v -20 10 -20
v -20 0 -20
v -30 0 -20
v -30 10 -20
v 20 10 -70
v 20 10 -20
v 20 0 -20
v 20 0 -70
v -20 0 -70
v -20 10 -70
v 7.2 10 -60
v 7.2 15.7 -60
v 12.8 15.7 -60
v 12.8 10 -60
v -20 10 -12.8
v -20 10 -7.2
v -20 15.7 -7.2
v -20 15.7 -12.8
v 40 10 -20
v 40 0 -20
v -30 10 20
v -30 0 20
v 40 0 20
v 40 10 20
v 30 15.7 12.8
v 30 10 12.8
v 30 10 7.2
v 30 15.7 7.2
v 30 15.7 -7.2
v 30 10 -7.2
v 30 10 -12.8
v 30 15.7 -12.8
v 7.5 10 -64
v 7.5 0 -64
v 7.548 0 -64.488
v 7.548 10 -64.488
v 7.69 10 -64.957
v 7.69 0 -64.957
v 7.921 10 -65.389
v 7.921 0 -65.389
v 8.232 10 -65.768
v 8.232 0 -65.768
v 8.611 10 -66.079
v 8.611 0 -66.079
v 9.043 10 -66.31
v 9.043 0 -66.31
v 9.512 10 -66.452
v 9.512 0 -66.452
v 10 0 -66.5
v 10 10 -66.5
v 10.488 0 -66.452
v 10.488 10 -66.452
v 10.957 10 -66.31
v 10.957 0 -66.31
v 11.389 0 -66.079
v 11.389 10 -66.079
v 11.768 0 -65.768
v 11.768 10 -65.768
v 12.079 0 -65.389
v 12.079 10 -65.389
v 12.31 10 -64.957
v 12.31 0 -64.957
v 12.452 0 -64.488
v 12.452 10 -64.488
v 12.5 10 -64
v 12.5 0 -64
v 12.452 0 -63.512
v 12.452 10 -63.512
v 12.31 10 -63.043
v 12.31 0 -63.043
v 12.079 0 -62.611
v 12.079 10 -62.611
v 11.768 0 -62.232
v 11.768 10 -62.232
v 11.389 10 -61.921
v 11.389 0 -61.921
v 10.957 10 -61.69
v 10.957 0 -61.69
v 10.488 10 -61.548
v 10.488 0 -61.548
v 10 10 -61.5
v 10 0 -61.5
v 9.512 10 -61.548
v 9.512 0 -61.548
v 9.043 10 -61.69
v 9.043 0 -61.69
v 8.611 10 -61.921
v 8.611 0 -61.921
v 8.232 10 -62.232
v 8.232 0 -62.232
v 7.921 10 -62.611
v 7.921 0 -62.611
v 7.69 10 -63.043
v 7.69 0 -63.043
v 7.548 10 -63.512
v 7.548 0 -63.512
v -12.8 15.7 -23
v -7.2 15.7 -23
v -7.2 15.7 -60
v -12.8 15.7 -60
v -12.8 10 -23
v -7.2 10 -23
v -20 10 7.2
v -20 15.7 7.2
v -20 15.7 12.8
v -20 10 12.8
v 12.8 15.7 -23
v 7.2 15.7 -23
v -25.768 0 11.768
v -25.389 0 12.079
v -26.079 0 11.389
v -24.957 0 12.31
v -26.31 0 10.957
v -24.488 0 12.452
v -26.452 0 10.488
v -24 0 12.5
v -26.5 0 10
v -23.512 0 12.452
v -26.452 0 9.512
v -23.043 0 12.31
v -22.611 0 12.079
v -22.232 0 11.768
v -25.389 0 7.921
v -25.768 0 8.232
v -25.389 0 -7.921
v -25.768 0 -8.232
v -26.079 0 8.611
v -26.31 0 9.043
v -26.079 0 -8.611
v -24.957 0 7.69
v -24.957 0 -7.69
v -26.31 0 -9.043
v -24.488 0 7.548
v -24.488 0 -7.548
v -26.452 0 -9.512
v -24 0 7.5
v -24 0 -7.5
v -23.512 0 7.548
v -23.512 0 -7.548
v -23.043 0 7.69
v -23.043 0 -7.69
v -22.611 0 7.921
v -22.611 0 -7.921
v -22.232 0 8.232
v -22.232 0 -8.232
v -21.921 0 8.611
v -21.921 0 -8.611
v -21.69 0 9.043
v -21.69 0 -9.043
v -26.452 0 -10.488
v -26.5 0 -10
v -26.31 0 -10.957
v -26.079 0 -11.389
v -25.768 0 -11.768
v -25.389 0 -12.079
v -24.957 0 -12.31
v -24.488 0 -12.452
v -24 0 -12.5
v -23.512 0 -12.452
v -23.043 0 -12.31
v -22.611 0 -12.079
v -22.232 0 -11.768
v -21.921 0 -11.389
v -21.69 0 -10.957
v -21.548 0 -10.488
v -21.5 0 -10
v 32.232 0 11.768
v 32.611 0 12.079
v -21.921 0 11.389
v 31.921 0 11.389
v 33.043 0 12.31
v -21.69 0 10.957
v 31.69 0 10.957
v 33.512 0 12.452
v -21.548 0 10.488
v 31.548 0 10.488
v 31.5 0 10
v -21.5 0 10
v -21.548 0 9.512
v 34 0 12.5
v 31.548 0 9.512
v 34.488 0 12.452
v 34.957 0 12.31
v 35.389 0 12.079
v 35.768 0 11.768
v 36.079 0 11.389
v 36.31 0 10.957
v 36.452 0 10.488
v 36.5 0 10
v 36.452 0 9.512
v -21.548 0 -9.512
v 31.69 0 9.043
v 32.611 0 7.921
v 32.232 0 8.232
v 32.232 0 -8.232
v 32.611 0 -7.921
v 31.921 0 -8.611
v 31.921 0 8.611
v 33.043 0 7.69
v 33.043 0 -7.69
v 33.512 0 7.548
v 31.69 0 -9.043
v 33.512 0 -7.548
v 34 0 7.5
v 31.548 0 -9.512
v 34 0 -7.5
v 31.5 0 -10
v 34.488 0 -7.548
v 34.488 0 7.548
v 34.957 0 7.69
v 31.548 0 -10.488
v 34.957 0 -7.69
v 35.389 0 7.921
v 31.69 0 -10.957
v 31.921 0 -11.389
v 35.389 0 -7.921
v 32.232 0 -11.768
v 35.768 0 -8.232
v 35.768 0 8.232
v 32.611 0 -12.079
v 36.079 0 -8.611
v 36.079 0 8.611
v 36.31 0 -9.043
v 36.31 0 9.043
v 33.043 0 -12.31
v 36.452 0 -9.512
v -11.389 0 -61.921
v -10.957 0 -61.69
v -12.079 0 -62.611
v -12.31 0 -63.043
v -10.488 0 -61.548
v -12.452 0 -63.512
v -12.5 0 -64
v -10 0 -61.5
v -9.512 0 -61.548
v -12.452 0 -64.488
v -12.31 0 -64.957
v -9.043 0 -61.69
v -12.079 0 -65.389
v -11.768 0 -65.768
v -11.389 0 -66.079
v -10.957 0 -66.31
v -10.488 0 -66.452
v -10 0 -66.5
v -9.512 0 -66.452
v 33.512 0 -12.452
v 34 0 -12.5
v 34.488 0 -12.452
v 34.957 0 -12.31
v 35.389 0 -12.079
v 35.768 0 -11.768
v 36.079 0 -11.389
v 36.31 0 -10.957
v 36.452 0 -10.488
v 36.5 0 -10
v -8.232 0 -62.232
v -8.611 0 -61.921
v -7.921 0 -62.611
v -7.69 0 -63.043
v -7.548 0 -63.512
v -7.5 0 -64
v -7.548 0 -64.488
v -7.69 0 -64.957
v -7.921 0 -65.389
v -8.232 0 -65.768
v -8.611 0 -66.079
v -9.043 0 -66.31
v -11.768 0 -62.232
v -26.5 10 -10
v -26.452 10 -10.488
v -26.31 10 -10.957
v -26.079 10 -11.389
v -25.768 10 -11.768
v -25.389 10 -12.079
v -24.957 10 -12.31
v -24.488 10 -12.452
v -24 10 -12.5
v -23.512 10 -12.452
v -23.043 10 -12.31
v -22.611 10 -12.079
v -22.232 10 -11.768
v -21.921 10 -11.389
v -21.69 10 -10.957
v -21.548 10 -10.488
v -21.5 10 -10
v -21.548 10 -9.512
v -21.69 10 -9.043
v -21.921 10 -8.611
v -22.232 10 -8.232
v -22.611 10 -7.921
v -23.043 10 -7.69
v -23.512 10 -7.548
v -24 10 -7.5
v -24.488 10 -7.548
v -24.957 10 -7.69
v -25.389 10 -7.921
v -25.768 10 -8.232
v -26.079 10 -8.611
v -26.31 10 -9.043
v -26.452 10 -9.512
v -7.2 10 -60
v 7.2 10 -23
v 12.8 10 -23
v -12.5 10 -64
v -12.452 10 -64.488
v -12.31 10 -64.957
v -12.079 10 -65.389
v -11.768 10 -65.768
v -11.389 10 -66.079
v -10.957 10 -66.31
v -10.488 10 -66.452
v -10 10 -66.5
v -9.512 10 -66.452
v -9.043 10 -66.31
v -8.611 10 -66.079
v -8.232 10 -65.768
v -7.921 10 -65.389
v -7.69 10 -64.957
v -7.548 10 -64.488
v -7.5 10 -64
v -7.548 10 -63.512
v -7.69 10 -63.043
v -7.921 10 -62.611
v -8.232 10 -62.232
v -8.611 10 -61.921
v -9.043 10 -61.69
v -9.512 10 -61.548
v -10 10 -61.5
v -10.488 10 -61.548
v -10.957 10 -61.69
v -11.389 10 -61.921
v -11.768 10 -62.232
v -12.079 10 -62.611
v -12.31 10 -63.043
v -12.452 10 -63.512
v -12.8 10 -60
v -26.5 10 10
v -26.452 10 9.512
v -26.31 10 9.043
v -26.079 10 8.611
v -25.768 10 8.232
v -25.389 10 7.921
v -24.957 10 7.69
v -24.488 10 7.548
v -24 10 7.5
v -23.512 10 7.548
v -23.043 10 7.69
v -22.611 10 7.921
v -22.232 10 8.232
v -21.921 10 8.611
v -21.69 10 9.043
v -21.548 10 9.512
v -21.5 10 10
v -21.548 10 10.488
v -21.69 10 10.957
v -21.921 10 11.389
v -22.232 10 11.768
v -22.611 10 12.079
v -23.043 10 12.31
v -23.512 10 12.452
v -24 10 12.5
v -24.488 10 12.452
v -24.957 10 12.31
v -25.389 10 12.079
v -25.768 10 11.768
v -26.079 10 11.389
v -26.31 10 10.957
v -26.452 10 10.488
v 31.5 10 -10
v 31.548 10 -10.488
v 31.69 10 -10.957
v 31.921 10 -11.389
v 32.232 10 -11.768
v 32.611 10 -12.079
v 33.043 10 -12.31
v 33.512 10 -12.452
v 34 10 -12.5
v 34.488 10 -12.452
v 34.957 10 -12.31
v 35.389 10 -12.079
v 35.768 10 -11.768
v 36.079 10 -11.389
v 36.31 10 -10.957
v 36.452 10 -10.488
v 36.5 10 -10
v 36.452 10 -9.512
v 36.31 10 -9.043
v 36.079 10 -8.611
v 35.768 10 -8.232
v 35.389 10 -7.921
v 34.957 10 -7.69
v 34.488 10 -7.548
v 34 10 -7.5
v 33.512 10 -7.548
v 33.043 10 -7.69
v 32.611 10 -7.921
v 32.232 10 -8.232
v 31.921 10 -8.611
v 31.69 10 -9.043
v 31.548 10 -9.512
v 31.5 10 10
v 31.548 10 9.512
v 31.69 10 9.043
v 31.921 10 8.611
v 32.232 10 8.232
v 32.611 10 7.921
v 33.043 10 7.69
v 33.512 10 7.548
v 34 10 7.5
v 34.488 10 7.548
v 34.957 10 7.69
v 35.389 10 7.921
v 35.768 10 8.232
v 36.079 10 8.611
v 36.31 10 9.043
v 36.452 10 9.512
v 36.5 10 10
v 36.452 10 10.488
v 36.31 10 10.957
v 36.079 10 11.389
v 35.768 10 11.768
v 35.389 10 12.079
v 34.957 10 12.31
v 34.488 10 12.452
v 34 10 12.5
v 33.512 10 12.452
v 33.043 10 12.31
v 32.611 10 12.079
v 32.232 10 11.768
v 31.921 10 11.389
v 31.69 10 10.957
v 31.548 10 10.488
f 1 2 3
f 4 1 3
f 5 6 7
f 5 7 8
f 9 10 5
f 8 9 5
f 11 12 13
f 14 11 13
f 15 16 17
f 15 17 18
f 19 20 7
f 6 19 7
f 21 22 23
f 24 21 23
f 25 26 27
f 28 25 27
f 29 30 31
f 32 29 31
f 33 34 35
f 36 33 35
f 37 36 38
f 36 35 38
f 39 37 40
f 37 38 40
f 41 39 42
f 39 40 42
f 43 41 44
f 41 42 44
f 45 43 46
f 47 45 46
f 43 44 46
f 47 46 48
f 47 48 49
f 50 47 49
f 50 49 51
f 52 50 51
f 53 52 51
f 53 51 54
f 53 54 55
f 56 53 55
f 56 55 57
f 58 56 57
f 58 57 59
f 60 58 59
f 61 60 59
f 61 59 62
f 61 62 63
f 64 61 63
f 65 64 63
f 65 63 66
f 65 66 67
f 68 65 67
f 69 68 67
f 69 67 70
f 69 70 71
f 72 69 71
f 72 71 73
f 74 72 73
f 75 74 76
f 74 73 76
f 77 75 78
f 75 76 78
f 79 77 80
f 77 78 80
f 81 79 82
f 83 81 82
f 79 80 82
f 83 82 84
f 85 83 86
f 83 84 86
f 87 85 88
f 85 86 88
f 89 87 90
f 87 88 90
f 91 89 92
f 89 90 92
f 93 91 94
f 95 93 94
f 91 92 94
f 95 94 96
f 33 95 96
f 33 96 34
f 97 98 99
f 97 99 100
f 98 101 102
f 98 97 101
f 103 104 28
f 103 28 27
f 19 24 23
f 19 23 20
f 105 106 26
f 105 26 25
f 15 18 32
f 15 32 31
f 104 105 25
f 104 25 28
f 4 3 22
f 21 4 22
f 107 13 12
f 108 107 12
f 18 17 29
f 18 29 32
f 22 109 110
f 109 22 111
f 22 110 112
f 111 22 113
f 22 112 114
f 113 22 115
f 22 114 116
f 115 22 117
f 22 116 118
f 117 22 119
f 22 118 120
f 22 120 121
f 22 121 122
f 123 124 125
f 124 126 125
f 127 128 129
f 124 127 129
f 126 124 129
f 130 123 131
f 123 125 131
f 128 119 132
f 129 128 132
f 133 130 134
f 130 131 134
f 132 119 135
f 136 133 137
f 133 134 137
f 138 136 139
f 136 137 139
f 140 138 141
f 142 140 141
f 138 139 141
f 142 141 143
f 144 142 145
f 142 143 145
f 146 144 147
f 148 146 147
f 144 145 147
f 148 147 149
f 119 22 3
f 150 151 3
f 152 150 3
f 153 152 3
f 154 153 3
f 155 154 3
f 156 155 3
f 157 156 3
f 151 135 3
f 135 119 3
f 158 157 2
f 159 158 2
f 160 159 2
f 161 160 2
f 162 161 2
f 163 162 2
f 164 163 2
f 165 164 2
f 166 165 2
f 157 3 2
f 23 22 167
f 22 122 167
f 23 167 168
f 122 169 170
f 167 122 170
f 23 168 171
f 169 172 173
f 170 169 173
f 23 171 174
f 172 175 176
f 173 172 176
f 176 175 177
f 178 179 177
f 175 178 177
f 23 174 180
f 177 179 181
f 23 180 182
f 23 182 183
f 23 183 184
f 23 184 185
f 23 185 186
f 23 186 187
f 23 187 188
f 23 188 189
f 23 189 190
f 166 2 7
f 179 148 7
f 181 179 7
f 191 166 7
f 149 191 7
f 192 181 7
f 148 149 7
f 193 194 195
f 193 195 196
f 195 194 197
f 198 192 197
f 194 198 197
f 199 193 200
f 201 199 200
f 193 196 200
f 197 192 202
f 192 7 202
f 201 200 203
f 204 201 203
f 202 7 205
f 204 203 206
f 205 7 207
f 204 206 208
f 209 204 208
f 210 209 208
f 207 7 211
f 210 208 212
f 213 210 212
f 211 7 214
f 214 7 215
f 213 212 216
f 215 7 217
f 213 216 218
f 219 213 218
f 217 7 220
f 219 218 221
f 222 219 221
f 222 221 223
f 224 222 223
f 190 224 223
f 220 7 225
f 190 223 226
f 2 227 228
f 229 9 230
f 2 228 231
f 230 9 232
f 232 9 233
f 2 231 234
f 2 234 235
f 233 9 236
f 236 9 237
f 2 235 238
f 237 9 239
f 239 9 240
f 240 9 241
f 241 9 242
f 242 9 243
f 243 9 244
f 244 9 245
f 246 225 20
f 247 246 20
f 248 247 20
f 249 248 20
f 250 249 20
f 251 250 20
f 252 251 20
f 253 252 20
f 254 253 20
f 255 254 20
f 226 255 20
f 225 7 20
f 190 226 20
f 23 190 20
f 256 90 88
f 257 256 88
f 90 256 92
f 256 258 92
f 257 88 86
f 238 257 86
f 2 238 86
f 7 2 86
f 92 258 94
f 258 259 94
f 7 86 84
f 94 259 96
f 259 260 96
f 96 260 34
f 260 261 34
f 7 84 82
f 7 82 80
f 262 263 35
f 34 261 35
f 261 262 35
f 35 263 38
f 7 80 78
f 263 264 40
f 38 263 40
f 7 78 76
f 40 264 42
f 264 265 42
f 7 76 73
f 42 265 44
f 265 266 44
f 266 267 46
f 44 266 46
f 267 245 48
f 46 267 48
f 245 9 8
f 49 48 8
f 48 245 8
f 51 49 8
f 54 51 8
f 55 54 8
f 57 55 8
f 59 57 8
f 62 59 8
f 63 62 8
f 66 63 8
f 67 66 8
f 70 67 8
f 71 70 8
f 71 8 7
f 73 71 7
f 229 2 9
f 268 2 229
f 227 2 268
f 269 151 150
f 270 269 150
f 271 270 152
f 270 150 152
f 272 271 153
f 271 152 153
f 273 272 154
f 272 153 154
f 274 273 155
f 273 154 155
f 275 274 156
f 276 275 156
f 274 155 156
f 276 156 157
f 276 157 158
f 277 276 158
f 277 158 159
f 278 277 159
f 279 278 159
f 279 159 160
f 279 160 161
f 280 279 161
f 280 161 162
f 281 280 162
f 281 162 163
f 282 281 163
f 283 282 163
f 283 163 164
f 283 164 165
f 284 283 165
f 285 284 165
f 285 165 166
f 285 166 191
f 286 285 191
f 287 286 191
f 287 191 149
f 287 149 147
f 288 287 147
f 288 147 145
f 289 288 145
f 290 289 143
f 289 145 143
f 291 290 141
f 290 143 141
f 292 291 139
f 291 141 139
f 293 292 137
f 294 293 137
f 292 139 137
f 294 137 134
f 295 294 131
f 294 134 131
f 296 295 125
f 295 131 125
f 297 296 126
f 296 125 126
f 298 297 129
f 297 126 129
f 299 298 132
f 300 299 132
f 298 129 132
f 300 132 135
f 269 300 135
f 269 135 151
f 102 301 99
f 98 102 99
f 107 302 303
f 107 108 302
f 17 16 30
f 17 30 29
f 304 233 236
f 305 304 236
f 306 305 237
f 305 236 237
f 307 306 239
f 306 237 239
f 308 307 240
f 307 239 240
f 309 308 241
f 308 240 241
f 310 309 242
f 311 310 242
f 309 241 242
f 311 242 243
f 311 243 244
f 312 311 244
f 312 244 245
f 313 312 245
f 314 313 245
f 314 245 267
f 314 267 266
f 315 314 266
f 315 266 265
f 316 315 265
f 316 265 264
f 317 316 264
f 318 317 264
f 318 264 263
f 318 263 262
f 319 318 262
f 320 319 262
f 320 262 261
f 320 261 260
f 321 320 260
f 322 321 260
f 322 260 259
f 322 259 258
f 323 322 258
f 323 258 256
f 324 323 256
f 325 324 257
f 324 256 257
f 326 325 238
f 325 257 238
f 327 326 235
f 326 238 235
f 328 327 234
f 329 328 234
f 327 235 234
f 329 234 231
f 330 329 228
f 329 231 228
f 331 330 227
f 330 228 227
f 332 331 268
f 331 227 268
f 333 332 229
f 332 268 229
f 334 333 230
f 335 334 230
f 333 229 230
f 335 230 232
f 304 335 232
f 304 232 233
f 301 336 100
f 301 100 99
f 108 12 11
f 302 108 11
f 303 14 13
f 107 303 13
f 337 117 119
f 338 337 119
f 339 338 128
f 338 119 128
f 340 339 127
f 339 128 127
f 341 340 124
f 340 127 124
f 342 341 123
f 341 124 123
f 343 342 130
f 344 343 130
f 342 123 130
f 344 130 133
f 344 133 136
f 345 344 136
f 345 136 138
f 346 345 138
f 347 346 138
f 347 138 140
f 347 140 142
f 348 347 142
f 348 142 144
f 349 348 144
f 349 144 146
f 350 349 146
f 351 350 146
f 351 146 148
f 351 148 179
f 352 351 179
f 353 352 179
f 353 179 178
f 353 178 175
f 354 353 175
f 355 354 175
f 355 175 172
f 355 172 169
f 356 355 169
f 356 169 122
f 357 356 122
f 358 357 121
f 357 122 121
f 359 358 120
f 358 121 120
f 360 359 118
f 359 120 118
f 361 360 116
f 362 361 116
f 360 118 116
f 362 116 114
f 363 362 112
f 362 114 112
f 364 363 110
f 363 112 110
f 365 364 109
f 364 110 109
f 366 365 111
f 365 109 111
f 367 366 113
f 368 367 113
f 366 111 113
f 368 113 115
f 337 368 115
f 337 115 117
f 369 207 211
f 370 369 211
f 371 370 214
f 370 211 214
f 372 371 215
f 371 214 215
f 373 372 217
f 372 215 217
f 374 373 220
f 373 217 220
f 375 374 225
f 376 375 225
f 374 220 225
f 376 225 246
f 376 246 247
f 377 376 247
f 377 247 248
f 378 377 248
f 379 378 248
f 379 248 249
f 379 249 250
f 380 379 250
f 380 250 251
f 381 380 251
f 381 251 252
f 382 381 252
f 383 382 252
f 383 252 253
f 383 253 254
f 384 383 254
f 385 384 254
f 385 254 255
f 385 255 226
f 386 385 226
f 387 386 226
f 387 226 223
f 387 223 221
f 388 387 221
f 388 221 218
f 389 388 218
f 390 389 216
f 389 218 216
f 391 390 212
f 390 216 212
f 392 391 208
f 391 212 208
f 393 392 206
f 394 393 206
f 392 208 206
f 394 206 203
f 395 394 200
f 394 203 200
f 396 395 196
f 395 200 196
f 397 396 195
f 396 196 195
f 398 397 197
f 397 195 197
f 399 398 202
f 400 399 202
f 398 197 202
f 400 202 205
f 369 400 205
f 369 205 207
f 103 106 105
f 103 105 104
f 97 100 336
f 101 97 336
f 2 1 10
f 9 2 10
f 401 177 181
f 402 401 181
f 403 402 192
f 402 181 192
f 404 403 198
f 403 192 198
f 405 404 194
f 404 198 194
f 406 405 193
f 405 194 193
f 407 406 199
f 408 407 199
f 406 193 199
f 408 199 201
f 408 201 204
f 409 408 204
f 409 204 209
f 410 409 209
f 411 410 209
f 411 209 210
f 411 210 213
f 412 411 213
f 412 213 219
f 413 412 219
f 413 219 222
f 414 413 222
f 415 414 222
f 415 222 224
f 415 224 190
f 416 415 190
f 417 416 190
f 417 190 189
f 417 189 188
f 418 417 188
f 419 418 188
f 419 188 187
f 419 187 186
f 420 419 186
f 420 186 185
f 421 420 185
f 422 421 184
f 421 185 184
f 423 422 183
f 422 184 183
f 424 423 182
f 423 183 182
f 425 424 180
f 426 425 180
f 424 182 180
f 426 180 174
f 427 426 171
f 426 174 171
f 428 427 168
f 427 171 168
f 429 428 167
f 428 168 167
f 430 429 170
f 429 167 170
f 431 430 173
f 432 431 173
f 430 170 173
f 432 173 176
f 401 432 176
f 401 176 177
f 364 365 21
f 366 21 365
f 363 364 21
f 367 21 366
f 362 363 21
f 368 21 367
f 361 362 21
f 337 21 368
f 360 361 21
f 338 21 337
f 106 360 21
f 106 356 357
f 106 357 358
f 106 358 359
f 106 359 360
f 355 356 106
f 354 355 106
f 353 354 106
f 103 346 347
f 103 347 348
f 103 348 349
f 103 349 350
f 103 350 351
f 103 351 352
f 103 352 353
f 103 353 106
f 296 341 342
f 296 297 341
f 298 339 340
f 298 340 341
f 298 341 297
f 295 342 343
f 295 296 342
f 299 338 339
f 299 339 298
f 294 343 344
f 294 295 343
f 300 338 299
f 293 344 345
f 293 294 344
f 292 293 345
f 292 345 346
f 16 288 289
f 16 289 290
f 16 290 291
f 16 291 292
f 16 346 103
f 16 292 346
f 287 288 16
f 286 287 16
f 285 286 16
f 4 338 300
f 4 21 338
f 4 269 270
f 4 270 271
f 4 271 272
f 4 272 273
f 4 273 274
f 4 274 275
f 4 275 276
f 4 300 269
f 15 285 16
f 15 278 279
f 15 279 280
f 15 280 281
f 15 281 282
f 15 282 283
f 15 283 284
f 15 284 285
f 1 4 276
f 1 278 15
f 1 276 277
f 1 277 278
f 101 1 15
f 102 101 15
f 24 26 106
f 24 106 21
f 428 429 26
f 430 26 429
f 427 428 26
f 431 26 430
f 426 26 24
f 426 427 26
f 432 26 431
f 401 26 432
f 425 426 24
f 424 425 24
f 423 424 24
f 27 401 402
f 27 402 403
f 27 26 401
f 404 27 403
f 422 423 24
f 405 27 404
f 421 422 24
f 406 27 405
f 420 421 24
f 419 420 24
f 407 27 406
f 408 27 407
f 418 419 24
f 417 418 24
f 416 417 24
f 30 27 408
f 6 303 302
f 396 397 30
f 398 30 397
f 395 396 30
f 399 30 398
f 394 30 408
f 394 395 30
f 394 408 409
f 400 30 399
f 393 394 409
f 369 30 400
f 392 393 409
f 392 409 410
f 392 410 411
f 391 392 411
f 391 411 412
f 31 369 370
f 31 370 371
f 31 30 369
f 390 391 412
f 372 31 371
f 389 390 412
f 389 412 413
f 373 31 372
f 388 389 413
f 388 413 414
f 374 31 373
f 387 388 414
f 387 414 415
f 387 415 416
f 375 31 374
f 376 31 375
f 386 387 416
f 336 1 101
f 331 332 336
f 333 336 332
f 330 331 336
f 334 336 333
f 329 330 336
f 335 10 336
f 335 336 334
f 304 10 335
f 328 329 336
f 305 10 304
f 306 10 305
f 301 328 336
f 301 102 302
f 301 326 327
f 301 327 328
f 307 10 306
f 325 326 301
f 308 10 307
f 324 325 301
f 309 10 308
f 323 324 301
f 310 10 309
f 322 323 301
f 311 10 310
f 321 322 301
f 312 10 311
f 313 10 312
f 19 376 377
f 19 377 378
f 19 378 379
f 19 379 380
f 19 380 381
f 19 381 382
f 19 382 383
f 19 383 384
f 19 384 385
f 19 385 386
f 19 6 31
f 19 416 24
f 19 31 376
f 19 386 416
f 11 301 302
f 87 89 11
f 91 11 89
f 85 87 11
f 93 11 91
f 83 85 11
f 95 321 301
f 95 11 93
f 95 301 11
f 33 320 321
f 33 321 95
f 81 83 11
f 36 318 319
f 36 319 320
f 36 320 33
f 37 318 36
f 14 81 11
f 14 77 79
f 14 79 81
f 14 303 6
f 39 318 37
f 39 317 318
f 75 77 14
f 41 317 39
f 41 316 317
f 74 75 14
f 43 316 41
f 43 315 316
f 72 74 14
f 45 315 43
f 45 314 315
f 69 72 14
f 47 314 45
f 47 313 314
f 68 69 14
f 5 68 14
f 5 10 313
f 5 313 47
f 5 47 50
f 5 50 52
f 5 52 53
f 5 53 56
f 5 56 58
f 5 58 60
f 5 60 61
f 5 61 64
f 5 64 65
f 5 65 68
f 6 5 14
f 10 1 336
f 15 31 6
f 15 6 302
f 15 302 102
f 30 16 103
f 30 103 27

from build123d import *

# Parameters (mm, degrees)
SALIENTE_EXTRUIR1_DEPTH = 10
SALIENTE_EXTRUIR3_DEPTH = 100
CROQUIS5_W              = 40
CROQUIS5_H              = 50
SALIENTE_EXTRUIR5_DEPTH = 10
SALIENTE_EXTRUIR7_DEPTH = 47
CROQUIS13_W             = 59.276280914
CROQUIS13_H             = 44.398623438
CORTAR_EXTRUIR4_DEPTH   = 30
CROQUIS14_R             = 2.5
CORTAR_EXTRUIR5_DEPTH   = 16.7
CROQUIS15_W             = 10
CROQUIS15_H             = 40
CROQUIS15_W_2           = 40
CROQUIS15_H_2           = 10
CORTAR_EXTRUIR6_DEPTH   = 6.7


with BuildPart() as part:
    # Croquis1 → Saliente-Extruir1 (new body)
    with BuildSketch(Plane(origin=(0, 0, 0), x_dir=(1, 0, 0), z_dir=(0, 1, 0))):
        Polygon((20, 20), (-30, 20), (-30, -20), (40, -20), (70, -20), (70, 20), align=None)
    extrude(amount=SALIENTE_EXTRUIR1_DEPTH)

    # Croquis3 → Saliente-Extruir3 (add)
    with BuildSketch(Plane.ZY.offset(30)):
        Polygon((10, 10), (12.8, 10), (12.8, 15.7), (7.2, 15.7), (7.2, 10), align=None)
        Polygon((-10, 10), (-7.2, 10), (-7.2, 15.7), (-12.8, 15.7), (-12.8, 10), align=None)
    extrude(amount=-SALIENTE_EXTRUIR3_DEPTH)

    # Croquis5 → Saliente-Extruir5 (add)
    with BuildSketch(Plane(origin=(0, 10, 0), x_dir=(1, 0, 0), z_dir=(0, 1, 0))):
        with Locations((0, 45)):
            Rectangle(CROQUIS5_W, CROQUIS5_H)
    extrude(amount=-SALIENTE_EXTRUIR5_DEPTH)

    # Croquis7 → Saliente-Extruir7 (add)
    with BuildSketch(Plane(origin=(0, 0, -70), x_dir=(-1, 0, 0), z_dir=(0, 0, -1))):
        Polygon((-10, 10), (-12.8, 10), (-12.8, 15.7), (-7.2, 15.7), (-7.2, 10), align=None)
        Polygon((10, 10), (7.2, 10), (7.2, 15.7), (12.8, 15.7), (12.8, 10), align=None)
    extrude(amount=-SALIENTE_EXTRUIR7_DEPTH)

    # Croquis13 → Cortar-Extruir4 (cut)
    with BuildSketch(Plane(origin=(70, 0, 0), x_dir=(0, 0, -1), z_dir=(1, 0, 0))):
        Rectangle(CROQUIS13_W, CROQUIS13_H)
    extrude(amount=-CORTAR_EXTRUIR4_DEPTH, mode=Mode.SUBTRACT)

    # Croquis14 → Cortar-Extruir5 (cut, through all)
    with BuildSketch(Plane(origin=(0, 0, 0), x_dir=(-1, 0, 0), z_dir=(0, -1, 0))):
        with Locations((-34, -10)):
            Circle(CROQUIS14_R)
        with Locations((-34, 10)):
            Circle(CROQUIS14_R)
        with Locations((24, -10)):
            Circle(CROQUIS14_R)
        with Locations((24, 10)):
            Circle(CROQUIS14_R)
        with Locations((10, 64)):
            Circle(CROQUIS14_R)
        with Locations((-10, 64)):
            Circle(CROQUIS14_R)
    extrude(amount=-CORTAR_EXTRUIR5_DEPTH, mode=Mode.SUBTRACT)

    # Croquis15 → Cortar-Extruir6 (cut, through all)
    with BuildSketch(Plane(origin=(0, 10, 0), x_dir=(1, 0, 0), z_dir=(0, 1, 0))):
        with Locations((35, 0)):
            Rectangle(CROQUIS15_W, CROQUIS15_H)
        with Locations((-25, 0)):
            Rectangle(CROQUIS15_W, CROQUIS15_H)
        with Locations((0, 65)):
            Rectangle(CROQUIS15_W_2, CROQUIS15_H_2)
    extrude(amount=CORTAR_EXTRUIR6_DEPTH, mode=Mode.SUBTRACT)


solid = part.part
